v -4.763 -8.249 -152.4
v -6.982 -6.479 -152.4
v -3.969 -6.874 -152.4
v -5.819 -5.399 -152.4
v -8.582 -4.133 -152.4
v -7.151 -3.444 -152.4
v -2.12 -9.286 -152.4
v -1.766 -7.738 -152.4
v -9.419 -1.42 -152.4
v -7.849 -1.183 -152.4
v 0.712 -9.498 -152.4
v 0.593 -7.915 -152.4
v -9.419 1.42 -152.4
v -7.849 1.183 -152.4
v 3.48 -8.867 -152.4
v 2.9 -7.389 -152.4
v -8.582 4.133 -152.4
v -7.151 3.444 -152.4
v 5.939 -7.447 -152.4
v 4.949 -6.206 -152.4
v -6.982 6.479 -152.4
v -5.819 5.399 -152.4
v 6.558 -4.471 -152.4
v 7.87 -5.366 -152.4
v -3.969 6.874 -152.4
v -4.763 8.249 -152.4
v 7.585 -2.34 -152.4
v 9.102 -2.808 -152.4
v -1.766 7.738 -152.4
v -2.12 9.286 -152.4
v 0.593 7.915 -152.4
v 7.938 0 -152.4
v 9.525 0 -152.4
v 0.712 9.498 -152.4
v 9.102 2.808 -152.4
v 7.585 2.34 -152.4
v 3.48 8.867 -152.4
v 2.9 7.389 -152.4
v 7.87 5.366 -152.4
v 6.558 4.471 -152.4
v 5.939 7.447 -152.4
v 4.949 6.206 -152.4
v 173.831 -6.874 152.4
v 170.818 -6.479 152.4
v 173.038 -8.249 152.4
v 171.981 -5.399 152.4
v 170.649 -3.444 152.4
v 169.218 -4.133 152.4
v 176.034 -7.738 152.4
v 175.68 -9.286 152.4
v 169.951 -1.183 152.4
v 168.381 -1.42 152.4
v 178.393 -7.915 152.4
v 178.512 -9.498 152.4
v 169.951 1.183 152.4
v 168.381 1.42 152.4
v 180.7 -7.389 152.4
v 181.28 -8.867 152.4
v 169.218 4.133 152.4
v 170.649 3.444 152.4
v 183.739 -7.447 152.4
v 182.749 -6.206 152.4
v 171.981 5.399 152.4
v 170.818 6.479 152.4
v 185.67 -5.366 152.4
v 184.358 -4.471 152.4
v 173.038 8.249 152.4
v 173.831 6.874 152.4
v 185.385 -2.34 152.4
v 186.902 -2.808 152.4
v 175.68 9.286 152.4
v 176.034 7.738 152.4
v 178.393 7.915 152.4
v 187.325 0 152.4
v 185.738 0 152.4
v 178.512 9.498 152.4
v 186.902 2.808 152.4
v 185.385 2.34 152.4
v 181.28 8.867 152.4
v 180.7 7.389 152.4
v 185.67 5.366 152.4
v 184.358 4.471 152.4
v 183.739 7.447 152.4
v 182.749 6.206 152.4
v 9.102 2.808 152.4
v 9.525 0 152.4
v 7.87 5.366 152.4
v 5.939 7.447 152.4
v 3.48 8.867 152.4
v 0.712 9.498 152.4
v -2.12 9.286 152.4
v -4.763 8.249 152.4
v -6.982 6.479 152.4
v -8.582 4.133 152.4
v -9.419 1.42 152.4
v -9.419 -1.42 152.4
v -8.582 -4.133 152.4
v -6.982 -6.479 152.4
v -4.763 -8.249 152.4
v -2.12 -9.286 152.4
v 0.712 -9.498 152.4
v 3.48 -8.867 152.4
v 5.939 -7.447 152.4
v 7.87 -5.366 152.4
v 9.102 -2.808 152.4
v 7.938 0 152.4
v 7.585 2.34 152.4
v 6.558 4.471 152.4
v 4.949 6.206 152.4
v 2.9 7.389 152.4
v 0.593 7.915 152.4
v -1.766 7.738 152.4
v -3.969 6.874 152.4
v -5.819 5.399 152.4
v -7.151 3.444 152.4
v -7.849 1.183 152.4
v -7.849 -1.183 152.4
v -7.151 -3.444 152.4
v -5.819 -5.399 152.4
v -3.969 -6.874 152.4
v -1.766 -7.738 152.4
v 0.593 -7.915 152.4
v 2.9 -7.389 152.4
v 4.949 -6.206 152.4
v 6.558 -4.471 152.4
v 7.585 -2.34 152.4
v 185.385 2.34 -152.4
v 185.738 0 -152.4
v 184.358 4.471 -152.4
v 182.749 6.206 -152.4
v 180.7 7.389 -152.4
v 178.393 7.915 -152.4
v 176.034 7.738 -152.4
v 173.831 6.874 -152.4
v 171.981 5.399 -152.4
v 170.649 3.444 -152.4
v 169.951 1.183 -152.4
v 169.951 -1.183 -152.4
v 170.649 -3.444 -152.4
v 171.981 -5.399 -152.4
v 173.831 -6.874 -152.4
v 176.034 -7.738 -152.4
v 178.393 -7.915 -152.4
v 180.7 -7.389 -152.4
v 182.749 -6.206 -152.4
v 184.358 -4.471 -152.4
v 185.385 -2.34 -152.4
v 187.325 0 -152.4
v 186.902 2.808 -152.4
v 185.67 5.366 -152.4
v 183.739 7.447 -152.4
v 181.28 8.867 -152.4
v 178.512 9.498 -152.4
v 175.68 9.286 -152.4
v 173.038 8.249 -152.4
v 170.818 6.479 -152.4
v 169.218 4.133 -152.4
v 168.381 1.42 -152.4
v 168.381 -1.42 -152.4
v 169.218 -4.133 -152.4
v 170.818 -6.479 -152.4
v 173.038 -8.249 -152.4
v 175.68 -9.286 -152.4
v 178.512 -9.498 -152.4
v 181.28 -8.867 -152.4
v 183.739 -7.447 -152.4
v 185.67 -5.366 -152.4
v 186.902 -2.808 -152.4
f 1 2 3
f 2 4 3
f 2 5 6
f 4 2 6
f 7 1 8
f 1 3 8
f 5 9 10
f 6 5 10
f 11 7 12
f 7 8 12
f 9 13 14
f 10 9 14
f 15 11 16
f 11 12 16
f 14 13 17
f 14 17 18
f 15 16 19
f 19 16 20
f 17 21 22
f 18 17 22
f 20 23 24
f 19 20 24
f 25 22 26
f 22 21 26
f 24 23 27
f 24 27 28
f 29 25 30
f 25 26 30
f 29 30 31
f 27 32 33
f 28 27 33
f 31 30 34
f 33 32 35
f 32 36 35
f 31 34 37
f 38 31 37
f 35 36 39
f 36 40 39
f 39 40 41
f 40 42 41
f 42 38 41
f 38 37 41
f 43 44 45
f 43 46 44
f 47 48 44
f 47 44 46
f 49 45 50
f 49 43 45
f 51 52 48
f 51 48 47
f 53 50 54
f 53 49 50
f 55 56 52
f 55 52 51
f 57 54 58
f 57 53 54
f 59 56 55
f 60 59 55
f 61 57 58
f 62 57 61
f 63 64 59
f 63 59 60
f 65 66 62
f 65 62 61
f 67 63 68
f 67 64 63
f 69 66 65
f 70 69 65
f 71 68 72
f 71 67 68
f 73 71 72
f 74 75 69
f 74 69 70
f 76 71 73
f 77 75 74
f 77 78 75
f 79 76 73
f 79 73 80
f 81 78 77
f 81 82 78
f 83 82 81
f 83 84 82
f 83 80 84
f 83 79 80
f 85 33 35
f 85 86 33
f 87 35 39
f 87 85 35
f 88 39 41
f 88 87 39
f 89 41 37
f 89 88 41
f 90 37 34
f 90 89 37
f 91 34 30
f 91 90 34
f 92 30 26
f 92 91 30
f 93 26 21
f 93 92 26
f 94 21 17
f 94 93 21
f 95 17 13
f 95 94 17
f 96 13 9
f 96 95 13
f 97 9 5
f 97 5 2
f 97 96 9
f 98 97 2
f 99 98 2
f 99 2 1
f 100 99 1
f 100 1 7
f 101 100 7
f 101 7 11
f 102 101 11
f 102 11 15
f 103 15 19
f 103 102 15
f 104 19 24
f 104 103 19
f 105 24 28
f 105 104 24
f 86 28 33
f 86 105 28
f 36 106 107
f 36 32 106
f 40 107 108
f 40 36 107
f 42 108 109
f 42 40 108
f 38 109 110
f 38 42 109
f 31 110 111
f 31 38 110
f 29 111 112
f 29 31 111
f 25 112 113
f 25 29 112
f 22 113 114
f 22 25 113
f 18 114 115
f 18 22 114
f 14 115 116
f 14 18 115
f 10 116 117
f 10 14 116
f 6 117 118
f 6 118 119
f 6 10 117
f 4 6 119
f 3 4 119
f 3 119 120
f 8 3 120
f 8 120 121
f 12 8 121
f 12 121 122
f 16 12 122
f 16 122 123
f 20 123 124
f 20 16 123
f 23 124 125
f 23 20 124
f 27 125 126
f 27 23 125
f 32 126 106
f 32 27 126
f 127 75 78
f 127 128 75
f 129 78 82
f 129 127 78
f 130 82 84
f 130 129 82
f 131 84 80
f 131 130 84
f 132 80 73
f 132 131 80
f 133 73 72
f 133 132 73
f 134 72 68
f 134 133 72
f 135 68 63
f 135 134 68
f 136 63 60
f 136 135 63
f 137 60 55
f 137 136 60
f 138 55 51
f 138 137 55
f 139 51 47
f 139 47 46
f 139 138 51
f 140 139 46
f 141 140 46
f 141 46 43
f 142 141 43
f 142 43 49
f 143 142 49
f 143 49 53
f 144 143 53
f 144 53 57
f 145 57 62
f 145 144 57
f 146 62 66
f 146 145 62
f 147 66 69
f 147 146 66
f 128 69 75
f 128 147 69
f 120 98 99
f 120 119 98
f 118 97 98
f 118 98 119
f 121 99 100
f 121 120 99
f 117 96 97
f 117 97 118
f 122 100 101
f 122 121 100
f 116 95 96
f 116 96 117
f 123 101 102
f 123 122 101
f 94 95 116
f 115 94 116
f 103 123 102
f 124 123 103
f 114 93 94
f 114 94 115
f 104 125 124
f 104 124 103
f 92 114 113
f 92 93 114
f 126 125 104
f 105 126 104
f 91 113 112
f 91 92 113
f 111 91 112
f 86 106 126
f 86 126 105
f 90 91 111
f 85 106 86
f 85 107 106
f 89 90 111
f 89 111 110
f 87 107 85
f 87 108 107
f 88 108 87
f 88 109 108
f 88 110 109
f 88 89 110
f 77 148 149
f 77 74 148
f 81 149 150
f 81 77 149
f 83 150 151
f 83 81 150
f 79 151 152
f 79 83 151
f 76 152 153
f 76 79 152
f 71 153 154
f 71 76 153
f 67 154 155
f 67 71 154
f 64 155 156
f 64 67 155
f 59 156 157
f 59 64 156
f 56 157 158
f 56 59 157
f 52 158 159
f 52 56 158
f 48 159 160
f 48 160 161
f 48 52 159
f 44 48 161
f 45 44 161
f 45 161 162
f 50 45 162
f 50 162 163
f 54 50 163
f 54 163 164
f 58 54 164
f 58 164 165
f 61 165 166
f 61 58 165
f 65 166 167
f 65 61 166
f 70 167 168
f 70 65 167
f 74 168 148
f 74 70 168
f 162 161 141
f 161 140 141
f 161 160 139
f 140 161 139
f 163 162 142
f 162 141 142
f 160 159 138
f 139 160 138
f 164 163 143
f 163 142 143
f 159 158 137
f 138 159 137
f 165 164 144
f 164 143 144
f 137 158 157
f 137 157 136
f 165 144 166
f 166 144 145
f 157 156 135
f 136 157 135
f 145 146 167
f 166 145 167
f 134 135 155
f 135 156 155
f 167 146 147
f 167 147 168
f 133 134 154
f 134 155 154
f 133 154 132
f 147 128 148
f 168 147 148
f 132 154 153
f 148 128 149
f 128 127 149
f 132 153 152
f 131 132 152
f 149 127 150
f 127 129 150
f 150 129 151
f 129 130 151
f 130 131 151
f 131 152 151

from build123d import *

# Parameters (mm, degrees)
SKETCH1_R             = 9.525
SKETCH1_R_2           = 7.9375
BOSS_EXTRUDE1_DEPTH   = 152.4
BOSS_EXTRUDE1_2_DEPTH = 152.4


with BuildPart() as part:
    # Sketch1 → Boss-Extrude1 (new body, symmetric)
    with BuildSketch(Plane.XY):
        Circle(SKETCH1_R)
        Circle(SKETCH1_R_2, mode=Mode.SUBTRACT)
    extrude(amount=BOSS_EXTRUDE1_DEPTH, both=True)


with BuildPart() as body_2:
    # Sketch1 → Boss-Extrude1 2 (new body, symmetric)
    with BuildSketch(Plane.XY):
        with Locations((177.8, 0)):
            Circle(SKETCH1_R)
        with Locations((177.8, 0)):
            Circle(SKETCH1_R_2, mode=Mode.SUBTRACT)
    extrude(amount=BOSS_EXTRUDE1_2_DEPTH, both=True)


solid = Compound([part.part, body_2.part])
